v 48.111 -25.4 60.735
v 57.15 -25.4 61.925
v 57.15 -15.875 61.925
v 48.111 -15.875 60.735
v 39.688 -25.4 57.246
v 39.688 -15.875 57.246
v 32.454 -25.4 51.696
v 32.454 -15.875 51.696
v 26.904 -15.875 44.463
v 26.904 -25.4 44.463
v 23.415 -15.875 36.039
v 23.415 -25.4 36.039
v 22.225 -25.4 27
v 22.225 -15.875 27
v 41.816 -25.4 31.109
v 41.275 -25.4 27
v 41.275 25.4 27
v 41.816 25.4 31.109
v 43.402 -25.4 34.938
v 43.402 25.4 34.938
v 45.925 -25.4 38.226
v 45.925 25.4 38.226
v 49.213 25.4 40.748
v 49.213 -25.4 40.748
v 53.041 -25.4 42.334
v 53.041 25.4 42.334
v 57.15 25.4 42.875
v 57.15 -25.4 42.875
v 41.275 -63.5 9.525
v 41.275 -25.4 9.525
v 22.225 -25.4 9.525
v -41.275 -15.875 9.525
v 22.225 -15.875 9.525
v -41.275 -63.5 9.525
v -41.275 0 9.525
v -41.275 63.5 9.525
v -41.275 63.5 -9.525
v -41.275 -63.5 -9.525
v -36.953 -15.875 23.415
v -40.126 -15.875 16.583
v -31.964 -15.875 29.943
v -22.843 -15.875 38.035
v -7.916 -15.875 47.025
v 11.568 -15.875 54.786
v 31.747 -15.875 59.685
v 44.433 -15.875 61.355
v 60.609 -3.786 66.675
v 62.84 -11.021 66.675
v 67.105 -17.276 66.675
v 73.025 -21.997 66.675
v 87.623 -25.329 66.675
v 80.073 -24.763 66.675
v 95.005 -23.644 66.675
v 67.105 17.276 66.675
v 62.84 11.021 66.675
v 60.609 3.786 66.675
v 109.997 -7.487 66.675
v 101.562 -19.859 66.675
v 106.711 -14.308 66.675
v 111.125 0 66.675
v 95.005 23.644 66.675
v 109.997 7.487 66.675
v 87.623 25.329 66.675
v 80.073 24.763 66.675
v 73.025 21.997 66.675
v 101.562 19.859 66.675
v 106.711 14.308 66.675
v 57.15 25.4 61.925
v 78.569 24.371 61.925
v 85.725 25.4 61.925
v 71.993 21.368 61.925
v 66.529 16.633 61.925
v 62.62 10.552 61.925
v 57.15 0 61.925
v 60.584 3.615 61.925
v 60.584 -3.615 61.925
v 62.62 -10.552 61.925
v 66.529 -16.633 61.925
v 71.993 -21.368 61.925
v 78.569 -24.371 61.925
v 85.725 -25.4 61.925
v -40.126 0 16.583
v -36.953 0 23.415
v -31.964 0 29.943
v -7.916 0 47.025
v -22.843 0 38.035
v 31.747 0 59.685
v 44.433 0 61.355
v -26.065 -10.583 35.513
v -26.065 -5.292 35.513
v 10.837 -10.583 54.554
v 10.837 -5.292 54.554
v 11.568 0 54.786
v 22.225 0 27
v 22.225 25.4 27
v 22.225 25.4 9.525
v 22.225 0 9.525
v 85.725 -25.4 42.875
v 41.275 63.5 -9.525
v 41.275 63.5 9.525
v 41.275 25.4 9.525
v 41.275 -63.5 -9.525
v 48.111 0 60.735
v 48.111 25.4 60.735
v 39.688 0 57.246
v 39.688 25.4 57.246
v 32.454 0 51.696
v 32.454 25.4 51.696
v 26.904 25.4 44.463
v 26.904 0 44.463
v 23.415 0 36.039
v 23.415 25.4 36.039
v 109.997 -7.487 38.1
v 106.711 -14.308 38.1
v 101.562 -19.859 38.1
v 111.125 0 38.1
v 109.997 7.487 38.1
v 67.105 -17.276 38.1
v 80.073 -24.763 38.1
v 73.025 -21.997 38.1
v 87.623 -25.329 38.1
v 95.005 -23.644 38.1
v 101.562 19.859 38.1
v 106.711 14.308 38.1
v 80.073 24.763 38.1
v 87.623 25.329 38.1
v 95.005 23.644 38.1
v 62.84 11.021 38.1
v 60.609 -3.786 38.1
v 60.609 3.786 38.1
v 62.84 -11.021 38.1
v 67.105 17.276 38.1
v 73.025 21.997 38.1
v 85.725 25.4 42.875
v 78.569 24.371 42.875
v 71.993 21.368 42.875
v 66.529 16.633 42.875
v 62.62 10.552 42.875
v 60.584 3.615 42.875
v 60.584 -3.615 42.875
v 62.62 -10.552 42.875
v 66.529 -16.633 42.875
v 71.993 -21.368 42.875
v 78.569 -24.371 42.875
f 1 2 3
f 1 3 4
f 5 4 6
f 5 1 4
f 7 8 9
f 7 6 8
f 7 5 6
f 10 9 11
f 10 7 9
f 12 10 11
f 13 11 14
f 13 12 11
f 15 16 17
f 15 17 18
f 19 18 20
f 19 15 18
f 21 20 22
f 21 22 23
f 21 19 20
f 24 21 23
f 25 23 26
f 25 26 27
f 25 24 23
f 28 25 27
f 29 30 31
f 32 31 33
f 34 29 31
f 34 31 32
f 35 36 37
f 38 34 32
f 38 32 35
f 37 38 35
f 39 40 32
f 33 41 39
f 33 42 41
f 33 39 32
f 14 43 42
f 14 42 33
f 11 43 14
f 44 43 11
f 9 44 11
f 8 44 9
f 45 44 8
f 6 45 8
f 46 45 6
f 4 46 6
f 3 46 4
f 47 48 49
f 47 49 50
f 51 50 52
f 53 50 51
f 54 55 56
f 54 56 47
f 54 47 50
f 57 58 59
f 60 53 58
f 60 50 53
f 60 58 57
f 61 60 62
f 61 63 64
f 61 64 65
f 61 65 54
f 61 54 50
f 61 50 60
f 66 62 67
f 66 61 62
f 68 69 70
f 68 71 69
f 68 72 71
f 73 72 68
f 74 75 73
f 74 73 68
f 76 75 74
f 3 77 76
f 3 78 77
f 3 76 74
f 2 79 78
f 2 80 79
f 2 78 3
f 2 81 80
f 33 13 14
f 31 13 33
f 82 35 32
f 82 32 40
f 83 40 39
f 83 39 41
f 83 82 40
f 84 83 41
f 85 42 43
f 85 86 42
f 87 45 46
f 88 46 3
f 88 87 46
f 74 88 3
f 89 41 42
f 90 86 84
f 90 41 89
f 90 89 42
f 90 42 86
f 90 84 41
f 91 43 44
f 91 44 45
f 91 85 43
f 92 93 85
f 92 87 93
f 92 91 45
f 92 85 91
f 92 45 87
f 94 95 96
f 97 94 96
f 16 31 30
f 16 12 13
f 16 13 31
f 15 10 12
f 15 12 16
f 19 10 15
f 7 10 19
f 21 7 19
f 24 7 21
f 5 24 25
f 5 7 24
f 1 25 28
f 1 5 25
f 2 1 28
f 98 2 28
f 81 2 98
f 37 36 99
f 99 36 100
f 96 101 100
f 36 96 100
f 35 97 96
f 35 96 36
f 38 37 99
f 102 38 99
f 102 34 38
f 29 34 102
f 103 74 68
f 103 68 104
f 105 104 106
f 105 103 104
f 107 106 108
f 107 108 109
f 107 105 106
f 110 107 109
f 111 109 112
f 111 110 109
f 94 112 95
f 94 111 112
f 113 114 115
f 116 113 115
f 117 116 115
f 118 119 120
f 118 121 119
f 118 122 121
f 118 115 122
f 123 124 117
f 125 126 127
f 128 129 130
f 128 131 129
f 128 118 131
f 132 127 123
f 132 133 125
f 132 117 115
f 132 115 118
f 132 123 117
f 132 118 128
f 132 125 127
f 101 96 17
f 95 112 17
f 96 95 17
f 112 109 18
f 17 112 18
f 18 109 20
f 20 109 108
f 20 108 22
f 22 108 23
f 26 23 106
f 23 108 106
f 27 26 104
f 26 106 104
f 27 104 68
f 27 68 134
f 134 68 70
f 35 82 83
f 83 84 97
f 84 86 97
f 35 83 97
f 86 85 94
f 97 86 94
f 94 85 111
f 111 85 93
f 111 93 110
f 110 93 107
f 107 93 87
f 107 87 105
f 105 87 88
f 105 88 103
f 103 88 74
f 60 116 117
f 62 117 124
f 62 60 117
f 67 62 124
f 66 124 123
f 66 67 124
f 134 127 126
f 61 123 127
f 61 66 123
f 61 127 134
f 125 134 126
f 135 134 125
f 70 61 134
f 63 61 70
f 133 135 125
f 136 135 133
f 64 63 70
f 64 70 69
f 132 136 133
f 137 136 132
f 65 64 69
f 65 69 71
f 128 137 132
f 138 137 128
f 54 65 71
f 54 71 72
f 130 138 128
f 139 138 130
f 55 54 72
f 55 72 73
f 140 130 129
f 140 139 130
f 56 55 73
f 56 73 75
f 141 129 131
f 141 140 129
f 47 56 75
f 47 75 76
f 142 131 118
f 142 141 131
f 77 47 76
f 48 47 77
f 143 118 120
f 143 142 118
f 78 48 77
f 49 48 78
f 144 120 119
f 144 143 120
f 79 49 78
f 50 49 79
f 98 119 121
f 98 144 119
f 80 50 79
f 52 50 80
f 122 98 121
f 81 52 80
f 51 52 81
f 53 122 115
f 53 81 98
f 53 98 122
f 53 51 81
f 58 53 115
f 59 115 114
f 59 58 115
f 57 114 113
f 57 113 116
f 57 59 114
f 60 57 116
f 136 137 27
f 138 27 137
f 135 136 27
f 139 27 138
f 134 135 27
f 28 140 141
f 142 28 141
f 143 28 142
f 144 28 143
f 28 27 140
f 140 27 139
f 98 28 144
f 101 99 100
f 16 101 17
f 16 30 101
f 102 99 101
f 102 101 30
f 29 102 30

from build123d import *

# Parameters (mm, degrees)
F1_DEPTH = 63.5
F0_W     = 25.4
F0_H     = 19.05
F2_DEPTH = 25.4
F3_DEPTH = 15.875


with BuildPart() as f1:
    # F0 (on Front) → F1 (new body, symmetric)
    with BuildSketch(Plane.XZ):
        Polygon((41.275, -9.525), (41.275, 9.525), (22.225, 9.525), (-41.275, 9.525), (-41.275, -9.525), align=None)
    extrude(amount=F1_DEPTH, both=True)

    # F0 (on Front) → F2 (join, symmetric)
    with BuildSketch(Plane.XZ):
        with BuildLine():
            Line((22.225, 9.525), (41.275, 9.525))
            Line((41.275, 9.525), (41.275, 27.0002))
            ThreePointArc((41.275, 27.0002), (45.9246798487, 38.2255201513), (57.15, 42.8752))
            Line((57.15, 42.8752), (60.325, 42.8752))
            Line((60.325, 42.8752), (60.325, 61.9252))
            Line((60.325, 61.9252), (57.15, 61.9252))
            ThreePointArc((57.15, 61.9252), (32.4542956671, 51.6959043329), (22.225, 27.0002))
            Line((22.225, 27.0002), (22.225, 9.525))
        make_face()
        with Locations((73.025, 52.4002)):
            Rectangle(F0_W, F0_H)
    extrude(amount=F2_DEPTH, both=True)

    # F0 (on Front) → F3 (join)
    with BuildSketch(Plane.XZ):
        with BuildLine():
            Line((-41.275, 9.525), (22.225, 9.525))
            Line((22.225, 9.525), (22.225, 27.0002))
            ThreePointArc((22.225, 27.0002), (32.4542956671, 51.6959043329), (57.15, 61.9252))
            add(Edge.make_bspline(
                [(-41.275, 9.525), (-41.0052500665, 37.4122597277), (10.2264313027, 61.962634325), (57.15, 61.9252)],
                knots=[0, 0, 0, 0, 111.5045361635, 111.5045361635, 111.5045361635, 111.5045361635], degree=3))
        make_face()
    extrude(amount=F3_DEPTH)

    # F0 (on Front) → F4 (revolve)
    with BuildSketch(Plane.XZ):
        Polygon((85.725, 61.9252), (85.725, 42.8752), (85.725, 38.1), (111.125, 38.1), (111.125, 66.675), (85.725, 66.675), align=None)
    revolve(axis=Axis((85.725, 0, 52.3875), (0, 0, 1)))


solid = f1.part
